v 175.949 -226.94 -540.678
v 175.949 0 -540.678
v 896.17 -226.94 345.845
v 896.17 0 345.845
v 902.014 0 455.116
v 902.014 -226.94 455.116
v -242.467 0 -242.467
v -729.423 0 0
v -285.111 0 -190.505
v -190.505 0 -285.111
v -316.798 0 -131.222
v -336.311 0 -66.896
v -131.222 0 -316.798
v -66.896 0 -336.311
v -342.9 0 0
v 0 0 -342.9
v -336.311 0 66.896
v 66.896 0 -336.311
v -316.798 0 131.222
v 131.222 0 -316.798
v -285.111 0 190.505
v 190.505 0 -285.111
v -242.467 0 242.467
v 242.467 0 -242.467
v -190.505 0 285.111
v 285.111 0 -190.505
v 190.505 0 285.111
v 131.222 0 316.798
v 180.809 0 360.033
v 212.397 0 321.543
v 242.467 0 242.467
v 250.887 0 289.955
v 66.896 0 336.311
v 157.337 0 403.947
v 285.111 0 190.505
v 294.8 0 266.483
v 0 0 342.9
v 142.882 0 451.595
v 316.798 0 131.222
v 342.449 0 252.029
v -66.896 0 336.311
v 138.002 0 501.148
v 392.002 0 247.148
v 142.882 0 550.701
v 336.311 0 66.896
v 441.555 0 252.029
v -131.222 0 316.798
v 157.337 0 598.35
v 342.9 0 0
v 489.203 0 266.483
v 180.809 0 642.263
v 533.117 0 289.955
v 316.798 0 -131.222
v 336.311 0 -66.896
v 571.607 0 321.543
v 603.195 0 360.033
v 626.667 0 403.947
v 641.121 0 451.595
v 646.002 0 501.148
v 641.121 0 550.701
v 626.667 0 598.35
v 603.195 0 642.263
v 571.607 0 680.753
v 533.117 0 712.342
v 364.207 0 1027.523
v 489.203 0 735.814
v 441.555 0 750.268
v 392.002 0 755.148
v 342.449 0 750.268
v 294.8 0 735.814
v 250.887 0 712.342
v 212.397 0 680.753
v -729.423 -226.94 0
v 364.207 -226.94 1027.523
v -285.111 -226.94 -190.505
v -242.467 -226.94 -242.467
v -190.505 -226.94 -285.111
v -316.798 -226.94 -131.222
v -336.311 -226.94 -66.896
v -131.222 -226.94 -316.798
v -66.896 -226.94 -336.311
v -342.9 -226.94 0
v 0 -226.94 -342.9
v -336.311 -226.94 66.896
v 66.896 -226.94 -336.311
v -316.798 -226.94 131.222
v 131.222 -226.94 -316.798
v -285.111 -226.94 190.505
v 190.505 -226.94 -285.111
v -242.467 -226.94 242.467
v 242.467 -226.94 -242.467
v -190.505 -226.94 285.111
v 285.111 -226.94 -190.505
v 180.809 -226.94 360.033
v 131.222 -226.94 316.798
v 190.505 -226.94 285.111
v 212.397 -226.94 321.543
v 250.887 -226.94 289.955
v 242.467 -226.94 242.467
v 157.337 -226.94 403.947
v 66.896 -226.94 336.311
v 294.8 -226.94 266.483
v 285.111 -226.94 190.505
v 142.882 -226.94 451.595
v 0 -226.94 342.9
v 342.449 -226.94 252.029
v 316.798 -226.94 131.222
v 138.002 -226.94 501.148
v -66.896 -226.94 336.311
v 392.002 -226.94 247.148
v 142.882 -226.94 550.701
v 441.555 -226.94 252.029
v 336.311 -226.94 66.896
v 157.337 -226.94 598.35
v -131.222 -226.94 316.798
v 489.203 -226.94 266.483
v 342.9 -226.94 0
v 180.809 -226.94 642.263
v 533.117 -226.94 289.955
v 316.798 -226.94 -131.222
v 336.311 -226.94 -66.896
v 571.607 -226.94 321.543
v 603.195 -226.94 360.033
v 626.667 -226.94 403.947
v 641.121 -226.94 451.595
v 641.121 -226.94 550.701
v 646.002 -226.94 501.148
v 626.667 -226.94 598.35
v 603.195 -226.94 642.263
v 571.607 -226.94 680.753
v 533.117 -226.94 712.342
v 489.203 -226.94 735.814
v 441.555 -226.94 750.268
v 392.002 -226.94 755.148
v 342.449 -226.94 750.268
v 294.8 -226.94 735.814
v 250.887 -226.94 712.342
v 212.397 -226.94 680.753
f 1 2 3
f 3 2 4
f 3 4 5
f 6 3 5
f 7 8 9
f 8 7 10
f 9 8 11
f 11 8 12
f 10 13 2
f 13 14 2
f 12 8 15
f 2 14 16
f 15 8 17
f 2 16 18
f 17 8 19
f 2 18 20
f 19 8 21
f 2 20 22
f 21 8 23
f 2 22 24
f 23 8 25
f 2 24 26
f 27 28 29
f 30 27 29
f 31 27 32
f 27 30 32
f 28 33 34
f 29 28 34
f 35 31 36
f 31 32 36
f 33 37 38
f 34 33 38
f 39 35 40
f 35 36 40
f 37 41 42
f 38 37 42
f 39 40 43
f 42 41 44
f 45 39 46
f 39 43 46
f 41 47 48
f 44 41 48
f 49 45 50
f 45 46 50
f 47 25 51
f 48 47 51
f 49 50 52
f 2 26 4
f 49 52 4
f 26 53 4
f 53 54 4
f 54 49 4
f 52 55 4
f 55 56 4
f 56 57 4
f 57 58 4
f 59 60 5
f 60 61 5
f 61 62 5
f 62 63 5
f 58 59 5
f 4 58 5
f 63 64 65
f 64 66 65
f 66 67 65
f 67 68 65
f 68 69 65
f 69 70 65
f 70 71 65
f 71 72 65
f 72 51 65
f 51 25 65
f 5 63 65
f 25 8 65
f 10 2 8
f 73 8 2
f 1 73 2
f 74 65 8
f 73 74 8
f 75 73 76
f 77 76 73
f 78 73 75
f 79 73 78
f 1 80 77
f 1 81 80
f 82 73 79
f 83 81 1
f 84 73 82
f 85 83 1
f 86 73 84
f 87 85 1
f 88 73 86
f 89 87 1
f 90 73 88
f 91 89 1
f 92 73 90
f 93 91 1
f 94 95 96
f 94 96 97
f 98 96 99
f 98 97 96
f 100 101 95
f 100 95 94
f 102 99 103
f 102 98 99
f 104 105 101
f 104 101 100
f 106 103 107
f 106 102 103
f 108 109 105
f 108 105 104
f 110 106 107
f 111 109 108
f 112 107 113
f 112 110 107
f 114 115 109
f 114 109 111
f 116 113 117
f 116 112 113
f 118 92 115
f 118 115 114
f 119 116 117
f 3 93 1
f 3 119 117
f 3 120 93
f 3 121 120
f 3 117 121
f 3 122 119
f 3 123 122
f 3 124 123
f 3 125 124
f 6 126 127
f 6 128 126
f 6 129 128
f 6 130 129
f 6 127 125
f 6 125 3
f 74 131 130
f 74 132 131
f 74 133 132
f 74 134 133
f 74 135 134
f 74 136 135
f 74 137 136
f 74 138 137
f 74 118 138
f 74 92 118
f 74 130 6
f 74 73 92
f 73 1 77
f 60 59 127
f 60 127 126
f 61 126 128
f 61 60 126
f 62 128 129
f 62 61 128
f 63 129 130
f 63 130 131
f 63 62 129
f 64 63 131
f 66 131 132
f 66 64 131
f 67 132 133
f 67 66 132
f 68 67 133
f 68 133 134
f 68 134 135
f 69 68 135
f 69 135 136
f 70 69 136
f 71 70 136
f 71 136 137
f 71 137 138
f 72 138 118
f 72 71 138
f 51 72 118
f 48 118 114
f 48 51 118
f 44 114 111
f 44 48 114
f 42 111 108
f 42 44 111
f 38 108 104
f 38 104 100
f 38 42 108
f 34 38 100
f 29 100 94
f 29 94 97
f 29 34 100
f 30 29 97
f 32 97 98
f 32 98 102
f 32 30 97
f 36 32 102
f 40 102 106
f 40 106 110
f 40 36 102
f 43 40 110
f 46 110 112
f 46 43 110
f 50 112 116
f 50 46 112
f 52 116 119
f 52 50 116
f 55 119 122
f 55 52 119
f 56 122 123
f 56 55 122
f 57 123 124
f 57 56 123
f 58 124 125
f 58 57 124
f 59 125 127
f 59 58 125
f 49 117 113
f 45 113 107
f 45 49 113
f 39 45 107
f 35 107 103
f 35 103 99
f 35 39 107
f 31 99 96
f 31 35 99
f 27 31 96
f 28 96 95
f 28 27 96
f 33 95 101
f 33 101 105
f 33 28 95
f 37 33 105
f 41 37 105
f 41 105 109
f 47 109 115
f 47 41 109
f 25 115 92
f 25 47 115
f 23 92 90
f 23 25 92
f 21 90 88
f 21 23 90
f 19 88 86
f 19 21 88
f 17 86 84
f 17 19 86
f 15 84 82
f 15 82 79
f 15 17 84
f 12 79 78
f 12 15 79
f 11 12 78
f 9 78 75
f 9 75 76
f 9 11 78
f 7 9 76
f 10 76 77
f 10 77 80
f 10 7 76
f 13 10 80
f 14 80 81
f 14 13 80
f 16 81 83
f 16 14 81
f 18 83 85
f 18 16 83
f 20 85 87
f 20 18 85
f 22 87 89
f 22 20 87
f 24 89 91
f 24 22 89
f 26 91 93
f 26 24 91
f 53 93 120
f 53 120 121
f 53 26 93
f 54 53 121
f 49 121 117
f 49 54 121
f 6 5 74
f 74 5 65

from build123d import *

# Parameters (mm, degrees)
F0_R     = 342.9
F0_R_2   = 254
F1_DEPTH = 226.939695


with BuildPart() as f1:
    # F0 (on Front) → F1 (new body)
    with BuildSketch(Plane.XZ):
        Polygon((364.206745, 1027.523371), (-729.422957, 0), (175.949275, -540.677786), (896.169722, 345.845073), (902.013715, 455.116268), align=None)
        Circle(F0_R, mode=Mode.SUBTRACT)
        with Locations((392.001907, 501.148325)):
            Circle(F0_R_2, mode=Mode.SUBTRACT)
    extrude(amount=F1_DEPTH)


solid = f1.part
